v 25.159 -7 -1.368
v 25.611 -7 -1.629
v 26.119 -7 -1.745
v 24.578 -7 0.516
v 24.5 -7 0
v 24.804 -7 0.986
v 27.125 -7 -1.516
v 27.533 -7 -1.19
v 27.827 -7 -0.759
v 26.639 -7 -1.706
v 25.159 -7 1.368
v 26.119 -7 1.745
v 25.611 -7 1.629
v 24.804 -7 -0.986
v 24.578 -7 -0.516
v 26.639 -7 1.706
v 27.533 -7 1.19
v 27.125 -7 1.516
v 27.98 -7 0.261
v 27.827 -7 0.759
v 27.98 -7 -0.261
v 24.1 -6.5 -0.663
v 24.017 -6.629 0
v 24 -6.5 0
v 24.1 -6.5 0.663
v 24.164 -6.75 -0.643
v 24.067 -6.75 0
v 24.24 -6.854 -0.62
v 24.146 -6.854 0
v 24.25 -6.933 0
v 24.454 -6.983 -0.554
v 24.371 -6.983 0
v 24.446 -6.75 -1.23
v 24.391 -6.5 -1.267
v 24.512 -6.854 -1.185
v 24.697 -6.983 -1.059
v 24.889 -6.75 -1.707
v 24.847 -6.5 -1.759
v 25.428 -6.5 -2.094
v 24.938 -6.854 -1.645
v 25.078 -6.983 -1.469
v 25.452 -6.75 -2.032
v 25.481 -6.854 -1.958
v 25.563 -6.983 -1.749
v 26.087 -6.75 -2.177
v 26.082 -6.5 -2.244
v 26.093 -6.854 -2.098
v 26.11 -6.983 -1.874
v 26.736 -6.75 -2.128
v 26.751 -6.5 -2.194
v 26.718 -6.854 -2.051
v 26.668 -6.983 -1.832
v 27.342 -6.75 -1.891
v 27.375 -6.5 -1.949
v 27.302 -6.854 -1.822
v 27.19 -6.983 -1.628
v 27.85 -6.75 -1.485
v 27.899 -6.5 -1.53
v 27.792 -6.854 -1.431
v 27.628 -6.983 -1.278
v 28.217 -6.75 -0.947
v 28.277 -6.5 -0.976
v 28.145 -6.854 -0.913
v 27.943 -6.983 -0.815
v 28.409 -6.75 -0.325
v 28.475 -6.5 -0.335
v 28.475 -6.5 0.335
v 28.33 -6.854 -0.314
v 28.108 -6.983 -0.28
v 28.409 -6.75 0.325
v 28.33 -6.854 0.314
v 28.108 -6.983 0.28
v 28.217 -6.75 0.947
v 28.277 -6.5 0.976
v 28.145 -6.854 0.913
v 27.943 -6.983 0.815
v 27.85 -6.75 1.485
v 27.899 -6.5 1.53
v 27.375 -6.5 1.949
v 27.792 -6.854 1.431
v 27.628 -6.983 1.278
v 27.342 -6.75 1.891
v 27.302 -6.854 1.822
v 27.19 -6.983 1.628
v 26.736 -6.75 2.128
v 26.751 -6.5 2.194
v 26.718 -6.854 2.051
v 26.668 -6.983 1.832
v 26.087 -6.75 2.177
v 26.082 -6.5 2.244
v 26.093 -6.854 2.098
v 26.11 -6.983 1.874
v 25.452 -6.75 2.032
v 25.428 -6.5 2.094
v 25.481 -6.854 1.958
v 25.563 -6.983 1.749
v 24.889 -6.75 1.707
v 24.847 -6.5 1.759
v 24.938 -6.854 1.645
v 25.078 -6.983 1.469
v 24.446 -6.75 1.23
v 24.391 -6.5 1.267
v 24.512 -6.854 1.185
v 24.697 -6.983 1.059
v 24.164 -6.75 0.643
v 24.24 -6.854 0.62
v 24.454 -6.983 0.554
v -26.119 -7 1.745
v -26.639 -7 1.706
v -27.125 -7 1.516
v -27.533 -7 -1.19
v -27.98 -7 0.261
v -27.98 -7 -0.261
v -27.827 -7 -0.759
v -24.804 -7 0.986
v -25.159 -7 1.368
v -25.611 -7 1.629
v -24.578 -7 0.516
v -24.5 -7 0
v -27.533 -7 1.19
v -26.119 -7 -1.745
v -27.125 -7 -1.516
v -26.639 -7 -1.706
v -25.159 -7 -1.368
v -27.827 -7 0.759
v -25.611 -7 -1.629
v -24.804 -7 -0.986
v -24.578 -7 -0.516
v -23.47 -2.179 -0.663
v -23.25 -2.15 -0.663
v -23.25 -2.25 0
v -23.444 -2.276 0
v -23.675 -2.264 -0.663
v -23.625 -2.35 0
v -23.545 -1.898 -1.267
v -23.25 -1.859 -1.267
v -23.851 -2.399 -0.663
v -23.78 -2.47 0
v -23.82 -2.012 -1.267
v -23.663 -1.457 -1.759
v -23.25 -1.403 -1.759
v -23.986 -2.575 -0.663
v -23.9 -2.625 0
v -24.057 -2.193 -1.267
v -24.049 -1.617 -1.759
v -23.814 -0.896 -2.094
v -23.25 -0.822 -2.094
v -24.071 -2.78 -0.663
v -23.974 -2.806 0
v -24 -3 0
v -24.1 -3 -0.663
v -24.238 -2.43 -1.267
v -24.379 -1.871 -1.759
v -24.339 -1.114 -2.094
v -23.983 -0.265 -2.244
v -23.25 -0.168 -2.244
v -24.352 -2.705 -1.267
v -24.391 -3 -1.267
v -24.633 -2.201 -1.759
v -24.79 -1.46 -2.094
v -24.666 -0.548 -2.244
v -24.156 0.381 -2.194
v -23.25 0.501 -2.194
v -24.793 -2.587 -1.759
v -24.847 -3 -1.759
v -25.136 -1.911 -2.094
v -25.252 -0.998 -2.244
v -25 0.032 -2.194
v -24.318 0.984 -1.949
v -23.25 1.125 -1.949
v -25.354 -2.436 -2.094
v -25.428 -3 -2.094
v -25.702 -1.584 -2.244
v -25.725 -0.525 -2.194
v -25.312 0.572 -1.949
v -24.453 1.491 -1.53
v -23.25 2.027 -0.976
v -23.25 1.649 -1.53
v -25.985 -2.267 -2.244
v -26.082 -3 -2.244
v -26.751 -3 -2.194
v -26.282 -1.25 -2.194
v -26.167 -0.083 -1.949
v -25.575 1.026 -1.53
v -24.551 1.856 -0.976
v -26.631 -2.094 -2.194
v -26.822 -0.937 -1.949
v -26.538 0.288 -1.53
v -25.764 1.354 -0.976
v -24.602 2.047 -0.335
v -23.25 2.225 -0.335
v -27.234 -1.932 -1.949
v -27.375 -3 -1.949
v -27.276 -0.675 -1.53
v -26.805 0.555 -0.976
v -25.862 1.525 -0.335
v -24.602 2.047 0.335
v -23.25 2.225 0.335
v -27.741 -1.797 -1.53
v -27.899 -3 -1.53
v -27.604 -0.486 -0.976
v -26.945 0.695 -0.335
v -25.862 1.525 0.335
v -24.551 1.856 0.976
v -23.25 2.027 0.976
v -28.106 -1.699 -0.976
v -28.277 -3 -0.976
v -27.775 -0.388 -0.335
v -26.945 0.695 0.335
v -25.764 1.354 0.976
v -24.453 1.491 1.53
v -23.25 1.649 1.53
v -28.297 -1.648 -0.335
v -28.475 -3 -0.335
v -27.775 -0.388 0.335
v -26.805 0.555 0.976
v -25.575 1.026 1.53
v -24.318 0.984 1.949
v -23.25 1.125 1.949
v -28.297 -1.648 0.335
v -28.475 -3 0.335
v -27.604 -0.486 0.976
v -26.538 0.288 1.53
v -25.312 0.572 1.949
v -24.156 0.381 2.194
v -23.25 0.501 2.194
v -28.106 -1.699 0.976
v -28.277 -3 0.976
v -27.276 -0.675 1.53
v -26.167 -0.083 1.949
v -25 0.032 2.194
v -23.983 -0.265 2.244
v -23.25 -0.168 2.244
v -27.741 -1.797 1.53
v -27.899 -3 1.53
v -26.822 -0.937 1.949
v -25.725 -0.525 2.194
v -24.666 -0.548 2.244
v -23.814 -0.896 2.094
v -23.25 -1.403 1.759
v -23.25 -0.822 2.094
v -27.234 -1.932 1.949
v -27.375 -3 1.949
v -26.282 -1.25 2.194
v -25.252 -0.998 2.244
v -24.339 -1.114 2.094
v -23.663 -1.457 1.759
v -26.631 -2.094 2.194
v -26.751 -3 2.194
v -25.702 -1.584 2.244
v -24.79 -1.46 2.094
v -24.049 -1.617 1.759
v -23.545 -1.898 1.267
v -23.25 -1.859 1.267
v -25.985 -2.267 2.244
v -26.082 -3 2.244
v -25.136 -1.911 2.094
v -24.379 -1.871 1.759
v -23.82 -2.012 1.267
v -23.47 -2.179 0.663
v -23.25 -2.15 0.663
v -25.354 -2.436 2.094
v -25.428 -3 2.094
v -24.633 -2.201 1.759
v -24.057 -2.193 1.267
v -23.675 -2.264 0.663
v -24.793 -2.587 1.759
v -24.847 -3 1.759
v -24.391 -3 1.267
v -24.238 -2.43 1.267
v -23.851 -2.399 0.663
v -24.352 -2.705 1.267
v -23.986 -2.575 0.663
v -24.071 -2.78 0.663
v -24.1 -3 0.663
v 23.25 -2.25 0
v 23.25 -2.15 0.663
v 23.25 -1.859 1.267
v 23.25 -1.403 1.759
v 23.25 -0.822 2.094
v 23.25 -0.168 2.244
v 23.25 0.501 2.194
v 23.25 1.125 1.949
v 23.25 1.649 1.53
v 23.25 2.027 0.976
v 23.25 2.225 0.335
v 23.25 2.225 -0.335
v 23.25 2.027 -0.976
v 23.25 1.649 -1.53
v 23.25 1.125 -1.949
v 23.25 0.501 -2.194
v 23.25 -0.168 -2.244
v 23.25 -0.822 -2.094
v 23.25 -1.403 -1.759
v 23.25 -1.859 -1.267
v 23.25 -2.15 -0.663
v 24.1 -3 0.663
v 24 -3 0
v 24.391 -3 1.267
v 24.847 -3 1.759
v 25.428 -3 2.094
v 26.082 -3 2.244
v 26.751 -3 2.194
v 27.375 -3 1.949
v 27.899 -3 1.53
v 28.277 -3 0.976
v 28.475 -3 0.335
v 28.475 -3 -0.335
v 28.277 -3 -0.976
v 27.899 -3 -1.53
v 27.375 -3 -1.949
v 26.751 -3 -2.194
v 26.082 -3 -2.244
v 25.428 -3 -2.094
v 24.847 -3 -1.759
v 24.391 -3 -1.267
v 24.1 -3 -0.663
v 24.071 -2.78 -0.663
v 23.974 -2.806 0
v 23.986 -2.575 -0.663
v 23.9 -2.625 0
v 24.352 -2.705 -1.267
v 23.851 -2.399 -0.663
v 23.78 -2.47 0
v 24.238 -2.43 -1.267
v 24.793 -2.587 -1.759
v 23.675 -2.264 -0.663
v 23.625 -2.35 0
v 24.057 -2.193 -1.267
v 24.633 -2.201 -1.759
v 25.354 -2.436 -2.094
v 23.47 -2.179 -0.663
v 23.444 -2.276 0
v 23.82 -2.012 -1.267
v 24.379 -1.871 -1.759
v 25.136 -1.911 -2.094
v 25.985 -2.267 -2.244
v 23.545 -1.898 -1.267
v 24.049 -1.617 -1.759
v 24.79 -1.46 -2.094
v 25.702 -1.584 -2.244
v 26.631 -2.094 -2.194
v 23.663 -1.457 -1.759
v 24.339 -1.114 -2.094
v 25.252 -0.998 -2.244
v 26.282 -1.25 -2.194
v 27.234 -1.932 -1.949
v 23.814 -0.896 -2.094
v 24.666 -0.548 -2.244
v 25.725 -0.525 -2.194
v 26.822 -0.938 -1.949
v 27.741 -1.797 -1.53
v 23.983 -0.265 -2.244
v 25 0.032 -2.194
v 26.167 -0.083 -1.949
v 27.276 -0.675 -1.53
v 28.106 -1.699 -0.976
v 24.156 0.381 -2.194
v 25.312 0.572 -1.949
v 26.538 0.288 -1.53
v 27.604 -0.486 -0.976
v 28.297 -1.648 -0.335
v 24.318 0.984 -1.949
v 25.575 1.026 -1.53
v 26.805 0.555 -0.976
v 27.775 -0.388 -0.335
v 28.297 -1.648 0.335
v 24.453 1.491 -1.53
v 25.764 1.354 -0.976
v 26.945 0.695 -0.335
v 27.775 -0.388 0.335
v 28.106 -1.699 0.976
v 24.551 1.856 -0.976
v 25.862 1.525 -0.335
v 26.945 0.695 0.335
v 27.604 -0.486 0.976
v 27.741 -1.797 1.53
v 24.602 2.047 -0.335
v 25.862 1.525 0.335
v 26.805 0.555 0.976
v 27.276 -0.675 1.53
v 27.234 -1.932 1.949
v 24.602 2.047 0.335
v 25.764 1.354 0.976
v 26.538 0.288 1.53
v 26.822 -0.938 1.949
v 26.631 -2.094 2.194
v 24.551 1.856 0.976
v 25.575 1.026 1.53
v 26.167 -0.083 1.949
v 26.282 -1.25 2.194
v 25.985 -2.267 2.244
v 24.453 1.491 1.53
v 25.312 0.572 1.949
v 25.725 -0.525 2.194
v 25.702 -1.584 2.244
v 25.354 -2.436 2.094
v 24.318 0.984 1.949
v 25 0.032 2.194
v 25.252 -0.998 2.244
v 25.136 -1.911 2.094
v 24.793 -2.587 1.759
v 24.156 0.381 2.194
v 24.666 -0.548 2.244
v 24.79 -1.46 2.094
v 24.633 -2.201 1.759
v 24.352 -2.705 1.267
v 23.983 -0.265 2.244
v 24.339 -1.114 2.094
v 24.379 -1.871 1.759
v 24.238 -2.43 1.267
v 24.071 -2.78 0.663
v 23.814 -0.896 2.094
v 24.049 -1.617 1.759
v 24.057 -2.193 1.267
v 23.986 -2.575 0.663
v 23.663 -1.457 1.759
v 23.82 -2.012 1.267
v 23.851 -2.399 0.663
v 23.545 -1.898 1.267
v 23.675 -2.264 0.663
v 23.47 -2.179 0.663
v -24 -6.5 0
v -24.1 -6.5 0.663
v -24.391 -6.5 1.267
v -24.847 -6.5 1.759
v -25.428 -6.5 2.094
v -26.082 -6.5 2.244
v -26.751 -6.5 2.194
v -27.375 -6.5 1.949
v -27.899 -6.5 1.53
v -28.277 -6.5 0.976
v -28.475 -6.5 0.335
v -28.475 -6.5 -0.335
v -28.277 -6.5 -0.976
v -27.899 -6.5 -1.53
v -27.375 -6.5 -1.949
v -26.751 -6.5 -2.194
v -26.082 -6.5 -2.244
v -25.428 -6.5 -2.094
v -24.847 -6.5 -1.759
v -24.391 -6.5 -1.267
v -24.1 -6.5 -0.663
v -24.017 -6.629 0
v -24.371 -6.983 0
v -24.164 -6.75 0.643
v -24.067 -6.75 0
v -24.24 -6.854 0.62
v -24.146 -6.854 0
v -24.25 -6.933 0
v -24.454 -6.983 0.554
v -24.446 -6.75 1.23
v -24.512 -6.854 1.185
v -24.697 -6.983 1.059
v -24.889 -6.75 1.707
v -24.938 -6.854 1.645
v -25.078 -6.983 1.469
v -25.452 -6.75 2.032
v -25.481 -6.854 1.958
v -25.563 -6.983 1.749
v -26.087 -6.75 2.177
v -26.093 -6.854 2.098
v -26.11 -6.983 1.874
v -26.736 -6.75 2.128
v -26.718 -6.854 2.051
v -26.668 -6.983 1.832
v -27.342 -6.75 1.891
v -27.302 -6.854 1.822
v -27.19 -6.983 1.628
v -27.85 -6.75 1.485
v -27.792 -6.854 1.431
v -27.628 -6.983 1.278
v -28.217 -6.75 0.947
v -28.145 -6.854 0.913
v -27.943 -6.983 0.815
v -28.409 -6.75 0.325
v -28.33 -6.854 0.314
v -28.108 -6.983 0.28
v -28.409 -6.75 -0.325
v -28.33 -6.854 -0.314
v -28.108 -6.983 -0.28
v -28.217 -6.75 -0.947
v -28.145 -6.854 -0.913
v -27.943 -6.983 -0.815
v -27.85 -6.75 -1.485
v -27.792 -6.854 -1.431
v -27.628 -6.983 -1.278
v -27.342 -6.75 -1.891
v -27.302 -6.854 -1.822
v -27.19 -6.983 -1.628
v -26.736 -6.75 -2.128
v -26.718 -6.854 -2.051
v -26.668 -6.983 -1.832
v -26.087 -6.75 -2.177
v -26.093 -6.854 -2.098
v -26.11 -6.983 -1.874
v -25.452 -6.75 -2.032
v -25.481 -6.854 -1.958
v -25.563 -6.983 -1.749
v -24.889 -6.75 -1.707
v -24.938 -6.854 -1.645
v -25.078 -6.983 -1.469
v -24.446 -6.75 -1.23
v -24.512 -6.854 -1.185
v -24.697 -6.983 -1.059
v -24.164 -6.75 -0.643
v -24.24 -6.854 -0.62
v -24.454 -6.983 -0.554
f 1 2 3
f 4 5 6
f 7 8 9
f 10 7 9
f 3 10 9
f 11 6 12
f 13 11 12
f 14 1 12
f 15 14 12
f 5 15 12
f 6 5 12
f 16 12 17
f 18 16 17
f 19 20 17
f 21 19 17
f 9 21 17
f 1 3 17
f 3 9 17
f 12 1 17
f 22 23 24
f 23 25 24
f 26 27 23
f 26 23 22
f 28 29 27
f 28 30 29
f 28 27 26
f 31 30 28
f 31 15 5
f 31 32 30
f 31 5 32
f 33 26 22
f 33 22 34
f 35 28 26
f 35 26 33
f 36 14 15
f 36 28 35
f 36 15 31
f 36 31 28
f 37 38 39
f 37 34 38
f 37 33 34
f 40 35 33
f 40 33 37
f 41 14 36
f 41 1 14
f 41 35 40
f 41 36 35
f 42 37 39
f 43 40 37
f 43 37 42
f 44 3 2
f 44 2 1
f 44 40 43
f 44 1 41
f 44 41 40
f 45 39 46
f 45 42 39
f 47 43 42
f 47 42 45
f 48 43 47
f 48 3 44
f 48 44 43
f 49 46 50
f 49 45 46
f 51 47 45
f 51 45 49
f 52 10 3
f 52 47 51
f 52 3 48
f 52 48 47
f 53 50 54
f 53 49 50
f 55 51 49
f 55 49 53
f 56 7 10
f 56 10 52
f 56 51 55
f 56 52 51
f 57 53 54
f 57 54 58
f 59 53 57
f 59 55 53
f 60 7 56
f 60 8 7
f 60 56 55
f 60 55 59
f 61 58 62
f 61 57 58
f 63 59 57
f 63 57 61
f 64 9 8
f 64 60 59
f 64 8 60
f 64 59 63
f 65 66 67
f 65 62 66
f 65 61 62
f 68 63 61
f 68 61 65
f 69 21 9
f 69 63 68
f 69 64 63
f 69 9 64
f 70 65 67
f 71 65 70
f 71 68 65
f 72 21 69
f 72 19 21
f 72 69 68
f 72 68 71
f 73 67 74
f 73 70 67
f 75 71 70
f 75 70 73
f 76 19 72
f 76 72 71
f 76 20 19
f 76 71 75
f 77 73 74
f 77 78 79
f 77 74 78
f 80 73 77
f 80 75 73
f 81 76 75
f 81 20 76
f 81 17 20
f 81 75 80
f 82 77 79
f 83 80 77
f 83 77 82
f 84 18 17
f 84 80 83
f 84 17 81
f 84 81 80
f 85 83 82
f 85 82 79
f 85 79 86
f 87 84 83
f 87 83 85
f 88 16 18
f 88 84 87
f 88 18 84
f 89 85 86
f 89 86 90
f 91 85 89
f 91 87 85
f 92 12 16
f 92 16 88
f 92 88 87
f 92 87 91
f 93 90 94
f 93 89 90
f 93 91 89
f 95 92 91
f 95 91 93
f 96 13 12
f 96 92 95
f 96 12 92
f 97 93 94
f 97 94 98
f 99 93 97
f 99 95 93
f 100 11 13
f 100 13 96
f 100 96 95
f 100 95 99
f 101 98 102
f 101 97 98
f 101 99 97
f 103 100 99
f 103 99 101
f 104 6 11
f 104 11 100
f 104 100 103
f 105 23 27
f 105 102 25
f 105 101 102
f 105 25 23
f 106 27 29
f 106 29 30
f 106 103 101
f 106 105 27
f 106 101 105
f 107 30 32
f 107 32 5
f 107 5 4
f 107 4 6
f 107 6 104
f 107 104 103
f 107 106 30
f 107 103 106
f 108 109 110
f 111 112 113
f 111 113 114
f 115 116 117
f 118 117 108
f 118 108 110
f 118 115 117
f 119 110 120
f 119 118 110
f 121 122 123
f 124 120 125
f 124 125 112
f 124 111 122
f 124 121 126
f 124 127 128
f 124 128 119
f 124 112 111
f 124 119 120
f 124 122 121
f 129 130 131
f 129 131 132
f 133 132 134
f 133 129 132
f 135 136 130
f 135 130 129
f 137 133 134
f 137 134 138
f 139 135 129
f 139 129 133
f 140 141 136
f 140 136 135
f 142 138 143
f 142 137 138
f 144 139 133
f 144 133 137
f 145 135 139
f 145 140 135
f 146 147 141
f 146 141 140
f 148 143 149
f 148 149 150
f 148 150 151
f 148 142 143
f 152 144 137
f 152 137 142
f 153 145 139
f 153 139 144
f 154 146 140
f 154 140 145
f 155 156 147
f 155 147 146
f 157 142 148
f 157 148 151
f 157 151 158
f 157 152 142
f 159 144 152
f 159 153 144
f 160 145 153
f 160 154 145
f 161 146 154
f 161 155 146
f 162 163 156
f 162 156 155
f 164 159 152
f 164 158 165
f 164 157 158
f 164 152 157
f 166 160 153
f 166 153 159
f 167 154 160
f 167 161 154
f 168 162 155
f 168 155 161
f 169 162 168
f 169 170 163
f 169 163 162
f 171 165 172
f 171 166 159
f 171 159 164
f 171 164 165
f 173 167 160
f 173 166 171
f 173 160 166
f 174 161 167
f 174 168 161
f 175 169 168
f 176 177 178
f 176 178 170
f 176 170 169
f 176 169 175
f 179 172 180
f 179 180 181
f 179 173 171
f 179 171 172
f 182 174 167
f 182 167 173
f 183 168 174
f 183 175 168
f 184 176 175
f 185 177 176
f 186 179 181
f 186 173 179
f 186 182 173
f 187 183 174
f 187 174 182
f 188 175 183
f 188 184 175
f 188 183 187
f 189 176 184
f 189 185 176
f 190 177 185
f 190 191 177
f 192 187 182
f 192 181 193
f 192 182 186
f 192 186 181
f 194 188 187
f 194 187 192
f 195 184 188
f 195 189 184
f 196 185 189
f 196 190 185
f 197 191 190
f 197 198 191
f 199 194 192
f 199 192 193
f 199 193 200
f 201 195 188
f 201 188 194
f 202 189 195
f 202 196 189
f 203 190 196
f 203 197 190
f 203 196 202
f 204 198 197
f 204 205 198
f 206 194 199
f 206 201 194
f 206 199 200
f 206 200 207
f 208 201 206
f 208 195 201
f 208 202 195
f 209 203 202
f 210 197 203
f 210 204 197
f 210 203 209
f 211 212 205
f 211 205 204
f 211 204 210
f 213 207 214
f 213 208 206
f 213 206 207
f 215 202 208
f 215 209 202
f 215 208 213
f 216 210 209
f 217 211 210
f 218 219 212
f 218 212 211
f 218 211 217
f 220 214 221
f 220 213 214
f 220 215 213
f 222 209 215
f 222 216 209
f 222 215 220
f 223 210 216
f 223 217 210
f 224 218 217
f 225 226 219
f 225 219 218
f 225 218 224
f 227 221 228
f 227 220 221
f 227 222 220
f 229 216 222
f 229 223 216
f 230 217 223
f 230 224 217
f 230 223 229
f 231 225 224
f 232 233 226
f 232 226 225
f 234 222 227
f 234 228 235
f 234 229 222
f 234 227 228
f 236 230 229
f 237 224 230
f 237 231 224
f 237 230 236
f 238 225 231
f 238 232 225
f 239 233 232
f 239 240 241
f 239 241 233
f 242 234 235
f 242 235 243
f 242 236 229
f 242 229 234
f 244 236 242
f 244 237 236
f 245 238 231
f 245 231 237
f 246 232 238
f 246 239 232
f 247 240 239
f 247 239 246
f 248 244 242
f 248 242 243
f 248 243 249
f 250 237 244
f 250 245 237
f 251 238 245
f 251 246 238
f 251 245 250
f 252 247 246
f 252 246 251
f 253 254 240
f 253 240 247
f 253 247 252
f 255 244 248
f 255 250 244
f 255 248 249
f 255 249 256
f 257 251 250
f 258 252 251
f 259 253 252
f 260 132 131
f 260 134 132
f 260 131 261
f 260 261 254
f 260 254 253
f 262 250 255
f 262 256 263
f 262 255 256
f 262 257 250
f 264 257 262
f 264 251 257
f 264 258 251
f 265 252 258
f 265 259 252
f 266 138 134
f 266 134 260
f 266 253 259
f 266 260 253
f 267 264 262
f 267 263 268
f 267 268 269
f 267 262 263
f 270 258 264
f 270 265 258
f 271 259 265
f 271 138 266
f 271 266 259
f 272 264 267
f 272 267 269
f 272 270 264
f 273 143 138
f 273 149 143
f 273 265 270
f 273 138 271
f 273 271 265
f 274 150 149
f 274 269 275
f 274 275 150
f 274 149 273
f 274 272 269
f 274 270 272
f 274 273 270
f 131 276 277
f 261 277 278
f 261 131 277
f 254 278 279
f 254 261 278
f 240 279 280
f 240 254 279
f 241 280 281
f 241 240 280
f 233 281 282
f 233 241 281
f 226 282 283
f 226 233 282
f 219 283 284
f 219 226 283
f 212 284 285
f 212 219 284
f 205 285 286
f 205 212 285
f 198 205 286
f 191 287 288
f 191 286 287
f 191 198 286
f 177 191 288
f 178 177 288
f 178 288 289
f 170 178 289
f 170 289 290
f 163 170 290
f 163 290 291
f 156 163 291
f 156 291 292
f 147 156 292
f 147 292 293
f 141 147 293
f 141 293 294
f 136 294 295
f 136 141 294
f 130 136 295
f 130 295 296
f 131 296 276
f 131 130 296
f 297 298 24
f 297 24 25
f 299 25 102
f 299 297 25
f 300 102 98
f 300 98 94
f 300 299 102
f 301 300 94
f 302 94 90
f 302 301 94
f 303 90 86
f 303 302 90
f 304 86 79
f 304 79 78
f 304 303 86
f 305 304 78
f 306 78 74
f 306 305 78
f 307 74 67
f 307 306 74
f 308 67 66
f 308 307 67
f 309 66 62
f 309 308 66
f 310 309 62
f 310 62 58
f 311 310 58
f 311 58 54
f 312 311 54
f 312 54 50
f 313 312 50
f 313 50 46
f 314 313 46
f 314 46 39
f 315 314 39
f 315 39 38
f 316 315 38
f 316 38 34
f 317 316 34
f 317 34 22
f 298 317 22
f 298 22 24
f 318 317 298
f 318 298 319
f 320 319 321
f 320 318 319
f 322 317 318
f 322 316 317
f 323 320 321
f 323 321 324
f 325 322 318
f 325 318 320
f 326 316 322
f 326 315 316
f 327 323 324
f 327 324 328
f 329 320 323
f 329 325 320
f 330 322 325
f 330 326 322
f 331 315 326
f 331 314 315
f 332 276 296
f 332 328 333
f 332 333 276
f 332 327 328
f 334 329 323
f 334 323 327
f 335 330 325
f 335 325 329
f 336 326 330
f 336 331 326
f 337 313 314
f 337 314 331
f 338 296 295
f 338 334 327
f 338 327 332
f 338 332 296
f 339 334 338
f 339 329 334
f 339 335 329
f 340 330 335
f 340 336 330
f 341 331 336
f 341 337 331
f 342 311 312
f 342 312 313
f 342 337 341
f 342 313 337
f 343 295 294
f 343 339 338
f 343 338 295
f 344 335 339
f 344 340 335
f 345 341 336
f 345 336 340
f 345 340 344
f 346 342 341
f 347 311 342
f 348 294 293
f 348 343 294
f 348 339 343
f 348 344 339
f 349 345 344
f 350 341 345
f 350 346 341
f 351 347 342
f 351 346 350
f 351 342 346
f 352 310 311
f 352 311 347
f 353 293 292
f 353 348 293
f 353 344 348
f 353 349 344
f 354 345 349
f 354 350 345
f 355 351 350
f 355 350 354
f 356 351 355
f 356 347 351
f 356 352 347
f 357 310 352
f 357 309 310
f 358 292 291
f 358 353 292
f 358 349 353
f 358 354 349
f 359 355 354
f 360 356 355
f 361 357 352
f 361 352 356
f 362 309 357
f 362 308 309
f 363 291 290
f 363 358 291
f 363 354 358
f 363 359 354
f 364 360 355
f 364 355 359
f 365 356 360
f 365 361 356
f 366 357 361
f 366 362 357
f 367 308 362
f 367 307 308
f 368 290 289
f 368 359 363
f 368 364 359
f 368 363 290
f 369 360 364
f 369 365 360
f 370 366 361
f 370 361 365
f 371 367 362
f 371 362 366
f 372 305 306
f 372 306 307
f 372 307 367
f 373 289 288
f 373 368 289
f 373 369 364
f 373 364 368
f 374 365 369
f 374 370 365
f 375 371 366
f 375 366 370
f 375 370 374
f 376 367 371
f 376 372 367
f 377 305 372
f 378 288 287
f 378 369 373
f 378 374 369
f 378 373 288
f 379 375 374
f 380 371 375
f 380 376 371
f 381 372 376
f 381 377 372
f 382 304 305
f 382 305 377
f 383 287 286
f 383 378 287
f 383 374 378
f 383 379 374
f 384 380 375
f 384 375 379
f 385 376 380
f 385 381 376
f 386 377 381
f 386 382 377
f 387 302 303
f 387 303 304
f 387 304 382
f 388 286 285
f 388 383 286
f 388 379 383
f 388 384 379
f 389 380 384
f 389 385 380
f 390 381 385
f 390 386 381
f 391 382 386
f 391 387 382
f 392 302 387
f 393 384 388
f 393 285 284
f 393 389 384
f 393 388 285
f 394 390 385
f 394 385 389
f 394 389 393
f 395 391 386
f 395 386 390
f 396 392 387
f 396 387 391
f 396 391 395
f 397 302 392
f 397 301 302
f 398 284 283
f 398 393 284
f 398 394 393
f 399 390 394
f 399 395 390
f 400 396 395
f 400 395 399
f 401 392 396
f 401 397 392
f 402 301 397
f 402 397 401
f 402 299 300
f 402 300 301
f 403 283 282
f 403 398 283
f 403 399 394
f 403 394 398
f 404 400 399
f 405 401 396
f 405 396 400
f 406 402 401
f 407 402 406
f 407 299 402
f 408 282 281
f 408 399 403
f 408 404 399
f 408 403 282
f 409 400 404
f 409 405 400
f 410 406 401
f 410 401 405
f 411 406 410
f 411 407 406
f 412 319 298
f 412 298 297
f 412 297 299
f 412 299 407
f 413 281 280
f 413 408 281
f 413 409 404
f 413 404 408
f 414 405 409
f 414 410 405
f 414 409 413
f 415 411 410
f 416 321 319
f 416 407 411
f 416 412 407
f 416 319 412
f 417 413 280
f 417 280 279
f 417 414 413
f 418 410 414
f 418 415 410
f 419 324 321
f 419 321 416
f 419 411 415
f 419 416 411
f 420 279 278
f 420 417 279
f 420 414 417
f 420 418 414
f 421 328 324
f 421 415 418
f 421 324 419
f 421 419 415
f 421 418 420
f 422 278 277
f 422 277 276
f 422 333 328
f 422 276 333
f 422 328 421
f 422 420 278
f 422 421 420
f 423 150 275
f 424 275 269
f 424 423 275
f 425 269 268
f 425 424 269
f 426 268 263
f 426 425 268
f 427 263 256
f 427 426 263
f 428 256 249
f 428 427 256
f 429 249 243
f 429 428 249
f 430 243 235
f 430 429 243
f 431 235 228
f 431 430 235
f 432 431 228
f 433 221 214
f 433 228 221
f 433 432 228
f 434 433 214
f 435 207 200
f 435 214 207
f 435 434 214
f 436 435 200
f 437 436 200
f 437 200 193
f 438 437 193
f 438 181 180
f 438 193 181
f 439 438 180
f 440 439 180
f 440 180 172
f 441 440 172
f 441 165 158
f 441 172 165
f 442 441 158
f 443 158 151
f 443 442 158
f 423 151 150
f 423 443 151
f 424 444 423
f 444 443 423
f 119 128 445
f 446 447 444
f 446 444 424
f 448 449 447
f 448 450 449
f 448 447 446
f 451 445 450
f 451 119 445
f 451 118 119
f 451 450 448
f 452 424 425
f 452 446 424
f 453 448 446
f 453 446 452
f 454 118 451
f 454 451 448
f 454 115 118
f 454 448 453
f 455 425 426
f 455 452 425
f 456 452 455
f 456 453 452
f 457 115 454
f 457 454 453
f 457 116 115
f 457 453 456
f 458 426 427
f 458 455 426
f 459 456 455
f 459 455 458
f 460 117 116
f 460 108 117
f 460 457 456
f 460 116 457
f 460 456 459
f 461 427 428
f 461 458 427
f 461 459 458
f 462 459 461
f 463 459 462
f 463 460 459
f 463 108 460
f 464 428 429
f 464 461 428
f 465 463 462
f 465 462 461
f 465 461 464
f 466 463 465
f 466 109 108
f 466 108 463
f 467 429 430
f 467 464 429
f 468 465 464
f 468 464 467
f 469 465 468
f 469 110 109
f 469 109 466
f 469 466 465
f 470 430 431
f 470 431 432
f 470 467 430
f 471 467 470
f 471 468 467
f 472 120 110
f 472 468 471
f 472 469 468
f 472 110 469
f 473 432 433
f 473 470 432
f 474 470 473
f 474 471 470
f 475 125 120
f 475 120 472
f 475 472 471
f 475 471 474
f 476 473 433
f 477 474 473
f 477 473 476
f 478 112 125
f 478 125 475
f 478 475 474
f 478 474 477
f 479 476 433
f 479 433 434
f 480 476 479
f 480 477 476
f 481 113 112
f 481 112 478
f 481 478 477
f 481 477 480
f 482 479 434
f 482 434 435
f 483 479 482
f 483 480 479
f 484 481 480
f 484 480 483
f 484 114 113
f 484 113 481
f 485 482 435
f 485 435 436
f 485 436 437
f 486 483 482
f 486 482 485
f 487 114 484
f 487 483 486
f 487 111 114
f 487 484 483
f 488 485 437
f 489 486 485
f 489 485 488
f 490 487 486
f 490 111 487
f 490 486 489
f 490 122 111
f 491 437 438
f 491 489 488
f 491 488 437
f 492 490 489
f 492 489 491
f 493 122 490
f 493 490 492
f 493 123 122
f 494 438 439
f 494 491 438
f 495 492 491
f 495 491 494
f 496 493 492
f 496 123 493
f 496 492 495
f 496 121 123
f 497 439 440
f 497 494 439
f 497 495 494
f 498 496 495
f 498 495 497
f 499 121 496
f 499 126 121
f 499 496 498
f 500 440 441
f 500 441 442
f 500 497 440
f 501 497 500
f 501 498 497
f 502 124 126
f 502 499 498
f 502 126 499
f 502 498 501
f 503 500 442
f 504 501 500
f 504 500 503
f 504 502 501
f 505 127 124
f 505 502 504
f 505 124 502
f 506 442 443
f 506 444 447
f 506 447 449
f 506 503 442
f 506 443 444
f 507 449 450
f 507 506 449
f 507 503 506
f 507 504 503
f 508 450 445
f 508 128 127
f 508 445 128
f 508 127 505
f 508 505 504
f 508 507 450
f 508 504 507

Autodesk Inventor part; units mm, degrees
ref_plane "YZ Plane" through (0, 0, 0) normal (1, 0, 0) x (0, 1, 0)
ref_plane "XZ Plane" through (0, 0, 0) normal (0, 1, 0) x (-1, 0, 0)
sketch "Sketch2" plane through (0, 0, 0) normal (0, 0, 1) x (1, 0, 0)
  line L0 (-26.25, -7) -> (26.25, -7) construction
  line L1 (26.25, -7) -> (26.25, -3)
  line L2 (23.25, 0) -> (-23.25, 0)
  line L3 (-26.25, -3) -> (-26.25, -7)
  arc A0 (-23.25, 0) -> (-26.25, -3) centre (-23.25, -3) ccw
  arc A1 (26.25, -3) -> (23.25, 0) centre (23.25, -3) ccw
  point P0 (0, 0)
  point P1 (26.25, 0)
  point P2 (-26.25, 0)
  point P3 (0, 0)
  dimension "d11" = 52.5
  dimension "d12" = 7
  dimension "d13" = 3
ref_plane "Work Plane1" through (-26.25, -7, 0) normal (0, -1, 0) x (1, 0, 0)
sketch "Sketch3" plane through (-26.25, -7, 0) normal (0, -1, 0) x (1, 0, 0)
  circle A0 centre (0, 0) radius 2.25
  point P0 (26.25, 0)
  dimension "d14" = 4.5
sweep "Sweep1" add profiles "Sketch3" path "Sketch2"
fillet "Fillet1" radius 0.5 6 edges at (28.5, -7, 0) (28.5, -3, 0) (23.25, 2.25, 0) (-23.25, 2.25, 0) (-28.5, -3, 0) (-28.5, -7, 0)
properties part number "Solder Roll Support 3" material "SAE 1020"
